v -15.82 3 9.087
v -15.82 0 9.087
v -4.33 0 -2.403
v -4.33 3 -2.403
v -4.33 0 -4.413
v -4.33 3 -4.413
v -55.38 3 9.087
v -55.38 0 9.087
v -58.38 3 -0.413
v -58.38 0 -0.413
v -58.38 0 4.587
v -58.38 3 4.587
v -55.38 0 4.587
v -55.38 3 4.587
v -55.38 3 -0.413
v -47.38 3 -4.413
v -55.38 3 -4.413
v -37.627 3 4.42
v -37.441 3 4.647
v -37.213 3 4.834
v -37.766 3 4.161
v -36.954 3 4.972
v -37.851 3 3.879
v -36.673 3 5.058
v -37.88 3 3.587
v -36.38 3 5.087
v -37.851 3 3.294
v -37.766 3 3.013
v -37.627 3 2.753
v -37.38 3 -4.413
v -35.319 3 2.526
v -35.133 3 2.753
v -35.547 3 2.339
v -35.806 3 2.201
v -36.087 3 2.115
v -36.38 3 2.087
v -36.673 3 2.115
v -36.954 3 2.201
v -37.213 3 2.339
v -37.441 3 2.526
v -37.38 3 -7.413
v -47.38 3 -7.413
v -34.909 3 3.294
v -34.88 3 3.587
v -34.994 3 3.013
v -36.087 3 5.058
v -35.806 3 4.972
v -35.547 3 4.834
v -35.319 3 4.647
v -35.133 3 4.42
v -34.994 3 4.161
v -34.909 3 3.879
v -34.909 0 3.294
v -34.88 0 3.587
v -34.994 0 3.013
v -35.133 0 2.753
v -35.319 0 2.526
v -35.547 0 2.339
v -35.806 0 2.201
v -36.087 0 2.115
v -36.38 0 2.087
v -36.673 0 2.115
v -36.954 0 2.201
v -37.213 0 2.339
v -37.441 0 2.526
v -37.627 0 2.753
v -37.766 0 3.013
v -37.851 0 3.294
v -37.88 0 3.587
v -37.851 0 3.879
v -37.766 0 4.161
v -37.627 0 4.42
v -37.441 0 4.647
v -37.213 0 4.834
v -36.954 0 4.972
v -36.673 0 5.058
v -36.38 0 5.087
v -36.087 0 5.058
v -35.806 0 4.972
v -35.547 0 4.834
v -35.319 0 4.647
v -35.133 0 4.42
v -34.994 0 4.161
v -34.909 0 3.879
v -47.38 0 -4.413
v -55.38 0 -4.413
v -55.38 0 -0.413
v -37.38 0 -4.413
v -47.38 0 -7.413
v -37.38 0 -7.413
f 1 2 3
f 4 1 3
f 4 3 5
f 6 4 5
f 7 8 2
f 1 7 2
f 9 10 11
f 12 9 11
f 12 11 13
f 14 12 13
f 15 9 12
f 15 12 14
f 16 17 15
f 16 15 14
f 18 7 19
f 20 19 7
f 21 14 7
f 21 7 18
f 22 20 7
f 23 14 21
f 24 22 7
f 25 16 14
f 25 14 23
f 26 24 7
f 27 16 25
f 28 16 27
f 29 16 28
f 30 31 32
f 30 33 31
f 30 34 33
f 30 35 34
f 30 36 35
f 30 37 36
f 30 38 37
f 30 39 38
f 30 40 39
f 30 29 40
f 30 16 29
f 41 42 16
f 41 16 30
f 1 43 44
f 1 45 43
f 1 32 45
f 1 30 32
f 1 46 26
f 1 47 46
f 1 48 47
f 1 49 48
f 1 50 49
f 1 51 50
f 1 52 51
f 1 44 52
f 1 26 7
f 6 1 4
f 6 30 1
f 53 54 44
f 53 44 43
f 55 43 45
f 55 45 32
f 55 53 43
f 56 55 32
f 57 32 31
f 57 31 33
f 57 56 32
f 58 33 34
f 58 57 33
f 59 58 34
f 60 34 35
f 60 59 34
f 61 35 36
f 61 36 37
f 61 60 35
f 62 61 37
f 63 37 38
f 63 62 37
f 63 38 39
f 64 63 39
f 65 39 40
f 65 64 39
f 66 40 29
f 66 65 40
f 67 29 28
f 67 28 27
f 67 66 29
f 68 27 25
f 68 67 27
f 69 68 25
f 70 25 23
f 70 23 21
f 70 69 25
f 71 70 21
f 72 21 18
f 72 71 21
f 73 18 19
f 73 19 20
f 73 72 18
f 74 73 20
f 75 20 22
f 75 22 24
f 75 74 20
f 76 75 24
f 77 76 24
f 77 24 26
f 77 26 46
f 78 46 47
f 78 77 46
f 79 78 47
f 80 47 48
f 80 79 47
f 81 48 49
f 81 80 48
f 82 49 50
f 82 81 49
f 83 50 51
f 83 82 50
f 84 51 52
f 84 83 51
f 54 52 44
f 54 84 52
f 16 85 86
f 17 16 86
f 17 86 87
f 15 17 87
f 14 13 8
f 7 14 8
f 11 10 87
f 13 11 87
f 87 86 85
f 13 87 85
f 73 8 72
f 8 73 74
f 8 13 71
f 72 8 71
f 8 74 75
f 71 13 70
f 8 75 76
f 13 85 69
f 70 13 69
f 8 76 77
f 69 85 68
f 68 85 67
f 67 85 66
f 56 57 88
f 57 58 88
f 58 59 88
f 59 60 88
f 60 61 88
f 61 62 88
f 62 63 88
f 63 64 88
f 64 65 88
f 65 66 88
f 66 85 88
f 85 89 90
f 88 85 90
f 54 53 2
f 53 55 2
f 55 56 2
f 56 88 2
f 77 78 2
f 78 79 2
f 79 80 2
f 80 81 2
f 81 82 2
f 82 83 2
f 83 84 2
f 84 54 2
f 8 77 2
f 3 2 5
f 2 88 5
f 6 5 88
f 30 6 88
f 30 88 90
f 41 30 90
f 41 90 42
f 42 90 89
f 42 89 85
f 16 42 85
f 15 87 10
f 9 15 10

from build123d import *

# Parameters (mm, degrees)
SKETCH1_R           = 1.5
BOSS_EXTRUDE1_DEPTH = 3


with BuildPart() as part:
    # Sketch1 → Boss-Extrude1 (new body)
    with BuildSketch(Plane(origin=(0, 0, 0), x_dir=(1, 0, 0), z_dir=(0, 1, 0))):
        Polygon((-47.380002118, 7.413403038), (-47.380002118, 4.413403038), (-55.380002118, 4.413403038), (-55.380002118, 0.413403038), (-58.380002118, 0.413403038), (-58.380002118, -4.586596962), (-55.380002118, -4.586596962), (-55.380002118, -9.086596962), (-15.820002118, -9.086596962), (-4.330002118, 2.403403038), (-4.330002118, 4.413403038), (-37.380002118, 4.413403038), (-37.380002118, 7.413403038), align=None)
        with Locations((-36.380002118, -3.586596962)):
            Circle(SKETCH1_R, mode=Mode.SUBTRACT)
    extrude(amount=BOSS_EXTRUDE1_DEPTH)


solid = part.part
